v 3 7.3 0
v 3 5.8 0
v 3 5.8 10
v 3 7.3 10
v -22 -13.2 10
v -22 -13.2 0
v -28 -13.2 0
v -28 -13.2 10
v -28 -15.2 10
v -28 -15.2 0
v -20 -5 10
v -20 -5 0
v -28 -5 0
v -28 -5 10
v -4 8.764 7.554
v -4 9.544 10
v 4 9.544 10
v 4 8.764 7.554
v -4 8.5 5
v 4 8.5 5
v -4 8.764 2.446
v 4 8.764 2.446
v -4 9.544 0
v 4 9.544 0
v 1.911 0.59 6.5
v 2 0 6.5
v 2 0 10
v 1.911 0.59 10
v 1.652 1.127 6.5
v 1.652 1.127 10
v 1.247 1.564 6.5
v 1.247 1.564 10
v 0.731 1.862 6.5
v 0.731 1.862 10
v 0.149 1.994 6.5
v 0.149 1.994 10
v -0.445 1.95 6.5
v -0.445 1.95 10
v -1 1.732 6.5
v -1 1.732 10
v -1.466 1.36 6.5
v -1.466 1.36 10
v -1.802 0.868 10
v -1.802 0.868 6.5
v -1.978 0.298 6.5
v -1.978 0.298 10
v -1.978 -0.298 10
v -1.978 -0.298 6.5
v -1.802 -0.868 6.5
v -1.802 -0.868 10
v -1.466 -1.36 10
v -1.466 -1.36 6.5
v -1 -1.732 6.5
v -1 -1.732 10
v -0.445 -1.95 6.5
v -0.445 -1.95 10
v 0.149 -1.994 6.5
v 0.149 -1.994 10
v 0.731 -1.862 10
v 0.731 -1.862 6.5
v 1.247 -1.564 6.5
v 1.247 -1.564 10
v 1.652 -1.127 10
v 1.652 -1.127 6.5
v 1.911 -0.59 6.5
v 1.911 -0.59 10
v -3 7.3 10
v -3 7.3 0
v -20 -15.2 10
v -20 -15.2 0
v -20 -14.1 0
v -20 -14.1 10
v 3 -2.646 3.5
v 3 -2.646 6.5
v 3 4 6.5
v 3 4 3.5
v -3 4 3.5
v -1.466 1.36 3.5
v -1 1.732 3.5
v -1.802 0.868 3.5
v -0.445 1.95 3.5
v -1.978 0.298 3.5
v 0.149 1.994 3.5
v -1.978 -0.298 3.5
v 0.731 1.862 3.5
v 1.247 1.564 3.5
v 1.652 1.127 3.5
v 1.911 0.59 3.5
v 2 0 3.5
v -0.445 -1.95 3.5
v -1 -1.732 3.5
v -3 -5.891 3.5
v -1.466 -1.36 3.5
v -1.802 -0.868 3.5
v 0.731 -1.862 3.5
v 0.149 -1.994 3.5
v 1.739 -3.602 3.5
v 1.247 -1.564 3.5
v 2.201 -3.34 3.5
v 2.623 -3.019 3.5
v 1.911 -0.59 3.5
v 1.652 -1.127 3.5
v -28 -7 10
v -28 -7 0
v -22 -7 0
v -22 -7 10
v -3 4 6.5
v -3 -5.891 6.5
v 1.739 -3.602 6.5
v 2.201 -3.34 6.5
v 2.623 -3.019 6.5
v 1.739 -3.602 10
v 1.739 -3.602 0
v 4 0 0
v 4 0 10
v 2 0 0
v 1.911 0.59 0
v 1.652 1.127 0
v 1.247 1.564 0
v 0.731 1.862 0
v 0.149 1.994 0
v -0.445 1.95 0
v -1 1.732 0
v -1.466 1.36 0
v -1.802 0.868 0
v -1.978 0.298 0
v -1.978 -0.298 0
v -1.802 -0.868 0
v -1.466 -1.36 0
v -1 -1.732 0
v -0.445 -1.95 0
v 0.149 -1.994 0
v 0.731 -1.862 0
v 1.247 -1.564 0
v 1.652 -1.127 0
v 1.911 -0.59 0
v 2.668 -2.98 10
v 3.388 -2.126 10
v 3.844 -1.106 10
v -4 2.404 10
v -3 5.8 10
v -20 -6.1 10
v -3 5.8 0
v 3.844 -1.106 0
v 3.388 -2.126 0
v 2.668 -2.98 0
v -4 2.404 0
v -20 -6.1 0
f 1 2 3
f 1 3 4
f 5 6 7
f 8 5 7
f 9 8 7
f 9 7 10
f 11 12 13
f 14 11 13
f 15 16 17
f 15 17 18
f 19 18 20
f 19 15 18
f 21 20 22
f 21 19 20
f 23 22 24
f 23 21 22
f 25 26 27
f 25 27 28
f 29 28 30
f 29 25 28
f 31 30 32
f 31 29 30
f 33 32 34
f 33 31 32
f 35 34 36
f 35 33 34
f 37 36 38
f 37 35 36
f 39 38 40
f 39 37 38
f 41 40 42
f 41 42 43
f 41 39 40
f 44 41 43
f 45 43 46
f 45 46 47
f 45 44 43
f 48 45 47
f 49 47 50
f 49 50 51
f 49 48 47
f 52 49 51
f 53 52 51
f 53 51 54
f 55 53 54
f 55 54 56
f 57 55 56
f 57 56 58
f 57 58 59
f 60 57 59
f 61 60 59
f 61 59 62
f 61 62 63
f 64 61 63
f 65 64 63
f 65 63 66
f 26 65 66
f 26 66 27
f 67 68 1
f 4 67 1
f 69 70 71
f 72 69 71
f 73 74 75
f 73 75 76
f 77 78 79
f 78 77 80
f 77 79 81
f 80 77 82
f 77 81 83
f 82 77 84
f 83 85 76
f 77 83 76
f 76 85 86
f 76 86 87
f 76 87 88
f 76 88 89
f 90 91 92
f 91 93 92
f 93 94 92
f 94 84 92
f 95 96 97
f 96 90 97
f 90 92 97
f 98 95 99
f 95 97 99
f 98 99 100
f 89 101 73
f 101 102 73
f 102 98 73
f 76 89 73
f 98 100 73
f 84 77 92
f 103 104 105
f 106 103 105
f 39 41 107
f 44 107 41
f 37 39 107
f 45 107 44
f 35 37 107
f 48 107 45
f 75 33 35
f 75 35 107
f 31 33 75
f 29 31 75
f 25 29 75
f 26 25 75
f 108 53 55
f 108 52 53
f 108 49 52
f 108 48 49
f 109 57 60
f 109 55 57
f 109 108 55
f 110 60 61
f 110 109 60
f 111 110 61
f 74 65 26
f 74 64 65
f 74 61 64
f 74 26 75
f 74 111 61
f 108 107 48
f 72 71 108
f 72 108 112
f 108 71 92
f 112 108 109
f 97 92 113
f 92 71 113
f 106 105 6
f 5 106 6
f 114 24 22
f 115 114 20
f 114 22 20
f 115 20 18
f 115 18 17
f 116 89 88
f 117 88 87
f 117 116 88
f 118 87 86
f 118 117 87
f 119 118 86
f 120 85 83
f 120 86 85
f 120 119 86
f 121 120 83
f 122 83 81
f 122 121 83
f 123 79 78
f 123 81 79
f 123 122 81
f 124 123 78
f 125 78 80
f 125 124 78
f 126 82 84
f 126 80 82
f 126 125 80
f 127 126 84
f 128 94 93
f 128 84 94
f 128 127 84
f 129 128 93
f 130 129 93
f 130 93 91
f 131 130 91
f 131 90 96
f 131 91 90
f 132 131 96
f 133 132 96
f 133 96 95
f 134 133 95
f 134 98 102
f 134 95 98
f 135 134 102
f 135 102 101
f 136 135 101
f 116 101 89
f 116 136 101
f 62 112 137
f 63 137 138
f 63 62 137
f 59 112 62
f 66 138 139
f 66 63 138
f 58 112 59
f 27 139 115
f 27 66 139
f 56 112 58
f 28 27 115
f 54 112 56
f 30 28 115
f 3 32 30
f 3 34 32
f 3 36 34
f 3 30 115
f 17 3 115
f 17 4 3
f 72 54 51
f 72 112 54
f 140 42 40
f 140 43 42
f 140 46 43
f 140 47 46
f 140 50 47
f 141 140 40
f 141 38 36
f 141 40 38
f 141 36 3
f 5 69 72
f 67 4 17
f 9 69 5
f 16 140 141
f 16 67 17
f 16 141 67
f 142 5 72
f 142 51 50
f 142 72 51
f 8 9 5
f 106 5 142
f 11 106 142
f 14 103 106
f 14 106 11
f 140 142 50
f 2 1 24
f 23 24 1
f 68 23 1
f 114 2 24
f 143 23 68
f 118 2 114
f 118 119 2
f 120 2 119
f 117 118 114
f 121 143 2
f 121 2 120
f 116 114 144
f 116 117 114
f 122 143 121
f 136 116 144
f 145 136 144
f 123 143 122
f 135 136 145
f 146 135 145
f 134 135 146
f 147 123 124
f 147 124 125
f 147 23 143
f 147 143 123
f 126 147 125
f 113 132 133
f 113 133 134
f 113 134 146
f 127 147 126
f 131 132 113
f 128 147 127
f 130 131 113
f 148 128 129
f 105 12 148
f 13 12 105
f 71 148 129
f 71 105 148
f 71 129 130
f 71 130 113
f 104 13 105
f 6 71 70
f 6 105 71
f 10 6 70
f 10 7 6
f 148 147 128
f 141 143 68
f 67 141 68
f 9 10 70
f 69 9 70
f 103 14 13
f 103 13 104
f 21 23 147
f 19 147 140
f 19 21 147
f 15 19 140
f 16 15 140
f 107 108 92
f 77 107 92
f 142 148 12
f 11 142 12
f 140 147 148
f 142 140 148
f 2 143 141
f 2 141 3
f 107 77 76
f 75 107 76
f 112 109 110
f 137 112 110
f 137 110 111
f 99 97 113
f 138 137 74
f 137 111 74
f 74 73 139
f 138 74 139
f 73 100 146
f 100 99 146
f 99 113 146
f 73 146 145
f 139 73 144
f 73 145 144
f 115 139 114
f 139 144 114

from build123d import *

# Parameters (mm, degrees)
ESBO_O1_R                = 2
ESBO_O1_W                = 6
ESBO_O1_H                = 1.5
RESSALTO_EXTRUS_O1_DEPTH = 10
RESSALTO_EXTRUS_O4_START = -4
RESSALTO_EXTRUS_O4_DEPTH = 8
CORTE_EXTRUS_O1_START    = -5.890675
ESBO_O3_W                = 6
ESBO_O3_H                = 3
CORTE_EXTRUS_O1_DEPTH    = 9.890675


with BuildPart() as part:
    # Esboço1 → Ressalto-extrusão1 (new body)
    with BuildSketch(Plane.XY):
        with BuildLine():
            Line((-28, -7), (-22, -7))
            Line((-22, -7), (-22, -13.2))
            Line((-22, -13.2), (-28, -13.2))
            Line((-28, -13.2), (-28, -15.2))
            Line((-28, -15.2), (-20, -15.2))
            Line((-20, -15.2), (-20, -14.1))
            Line((-20, -14.1), (1.739413567, -3.602005059))
            ThreePointArc((1.739413567, -3.602005059), (3.388041784, -2.12630498), (4, 0))
            Line((4, 0), (4, 8))
            Line((4, 8), (-4, 8))
            Line((-4, 8), (-4, 2.403900213))
            Line((-4, 2.403900213), (-20, -6.1))
            Line((-20, -6.1), (-20, -5))
            Line((-20, -5), (-28, -5))
            Line((-28, -5), (-28, -7))
        make_face()
        Circle(ESBO_O1_R, mode=Mode.SUBTRACT)
        with Locations((0, 6.55)):
            Rectangle(ESBO_O1_W, ESBO_O1_H, mode=Mode.SUBTRACT)
    extrude(amount=RESSALTO_EXTRUS_O1_DEPTH)

    # Esboço2 → Ressalto-extrusão4 (add)
    with BuildSketch(Plane(origin=(0, 0, 0), x_dir=(0, 0, -1), z_dir=(1, 0, 0)).offset(RESSALTO_EXTRUS_O4_START)):
        with BuildLine():
            ThreePointArc((-10, 9.543560763), (-5, 8.5), (0, 9.543560763))
            Line((0, 9.543560763), (0, 8))
            Line((0, 8), (-10, 8))
            Line((-10, 8), (-10, 9.543560763))
        make_face()
    extrude(amount=RESSALTO_EXTRUS_O4_DEPTH)

    # Esboço3 → Corte-extrusão1 (cut)
    with BuildSketch(Plane(origin=(0, 0, 0), x_dir=(1, 0, 0), z_dir=(0, 1, 0)).offset(CORTE_EXTRUS_O1_START)):
        with Locations((0, -5)):
            Rectangle(ESBO_O3_W, ESBO_O3_H)
    extrude(amount=CORTE_EXTRUS_O1_DEPTH, mode=Mode.SUBTRACT)


solid = part.part
